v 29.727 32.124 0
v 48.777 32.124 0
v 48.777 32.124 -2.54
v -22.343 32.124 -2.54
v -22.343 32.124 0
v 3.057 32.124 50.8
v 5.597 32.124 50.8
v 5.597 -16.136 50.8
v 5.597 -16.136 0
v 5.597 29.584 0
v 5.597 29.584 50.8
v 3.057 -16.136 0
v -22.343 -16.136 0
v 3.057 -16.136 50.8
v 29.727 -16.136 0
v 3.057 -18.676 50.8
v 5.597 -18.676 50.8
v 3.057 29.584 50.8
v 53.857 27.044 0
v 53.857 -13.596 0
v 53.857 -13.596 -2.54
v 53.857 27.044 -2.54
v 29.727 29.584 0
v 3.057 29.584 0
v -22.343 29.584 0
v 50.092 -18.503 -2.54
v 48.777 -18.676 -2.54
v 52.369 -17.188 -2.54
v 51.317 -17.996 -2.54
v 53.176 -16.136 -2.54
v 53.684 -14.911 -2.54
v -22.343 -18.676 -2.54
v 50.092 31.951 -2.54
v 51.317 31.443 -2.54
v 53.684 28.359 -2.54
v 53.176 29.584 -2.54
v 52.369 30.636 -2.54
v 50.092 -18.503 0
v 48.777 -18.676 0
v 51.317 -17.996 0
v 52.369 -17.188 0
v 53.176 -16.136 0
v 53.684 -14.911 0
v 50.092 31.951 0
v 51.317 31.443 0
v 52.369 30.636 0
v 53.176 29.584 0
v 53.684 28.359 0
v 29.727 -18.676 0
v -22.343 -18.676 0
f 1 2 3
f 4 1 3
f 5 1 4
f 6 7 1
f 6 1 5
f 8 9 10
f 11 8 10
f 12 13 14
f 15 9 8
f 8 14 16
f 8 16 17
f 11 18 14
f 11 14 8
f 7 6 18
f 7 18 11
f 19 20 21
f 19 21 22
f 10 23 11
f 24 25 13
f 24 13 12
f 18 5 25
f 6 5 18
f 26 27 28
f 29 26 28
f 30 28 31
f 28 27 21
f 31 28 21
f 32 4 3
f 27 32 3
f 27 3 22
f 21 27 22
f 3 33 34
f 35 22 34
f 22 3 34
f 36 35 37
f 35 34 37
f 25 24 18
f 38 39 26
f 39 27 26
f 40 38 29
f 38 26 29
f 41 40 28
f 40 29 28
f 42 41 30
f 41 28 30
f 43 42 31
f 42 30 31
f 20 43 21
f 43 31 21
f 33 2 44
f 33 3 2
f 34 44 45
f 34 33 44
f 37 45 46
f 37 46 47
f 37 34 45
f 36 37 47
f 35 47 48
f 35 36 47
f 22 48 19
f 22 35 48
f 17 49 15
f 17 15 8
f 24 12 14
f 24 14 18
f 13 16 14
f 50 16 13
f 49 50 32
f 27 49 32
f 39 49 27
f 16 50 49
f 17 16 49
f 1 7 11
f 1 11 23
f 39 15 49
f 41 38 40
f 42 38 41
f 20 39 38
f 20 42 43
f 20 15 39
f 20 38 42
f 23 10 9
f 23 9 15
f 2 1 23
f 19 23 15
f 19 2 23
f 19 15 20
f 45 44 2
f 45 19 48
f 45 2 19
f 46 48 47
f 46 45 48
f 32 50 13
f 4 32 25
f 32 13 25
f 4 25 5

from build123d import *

# Parameters (mm, degrees)
F0_W     = 48.26
F0_H     = 50.8
F0_W_2   = 25.4
F0_W_3   = 2.54
F1_DEPTH = 2.54
F2_DEPTH = 50.8
F4_DEPTH = 2.54
F6_DEPTH = 2.54
F7_R     = 5.08


with BuildPart() as f1:
    # F0 (on Top) → F1 (new body)
    with BuildSketch(Plane.XY):
        with Locations((29.726995, 6.723735)):
            Rectangle(F0_W, F0_H)
        with Locations((-9.643005, 6.723735)):
            Rectangle(F0_W_2, F0_H)
        with Locations((4.326995, 6.723735)):
            Rectangle(F0_W_3, F0_H)
    extrude(amount=-F1_DEPTH)

    # F0 (on Top) → F2 (join)
    with BuildSketch(Plane.XY):
        with Locations((4.326995, 6.723735)):
            Rectangle(F0_W_3, F0_H)
    extrude(amount=F2_DEPTH)

    # F3 (on face) → F4 (join)
    with BuildSketch(Plane.XZ.offset(18.676265)):
        Polygon((3.056995, 50.8), (-22.343005, 0), (3.056995, 0), align=None)
        Polygon((29.726995, 0), (5.596995, 50.8), (5.596995, 0), align=None)
    extrude(amount=-F4_DEPTH)

    # F5 (on face) → F6 (join)
    with BuildSketch(Plane(origin=(0, 32.123735, 0), x_dir=(-1, 0, 0), z_dir=(0, 1, 0))):
        Polygon((22.343005, 0), (-3.056995, 50.8), (-3.056995, 0), align=None)
        Polygon((-5.596995, 0), (-5.596995, 50.8), (-29.726995, 0), align=None)
    extrude(amount=-F6_DEPTH)

    # F7
    f7_edges = [f1.edges().sort_by_distance(p)[0] for p in [
        (53.856995, -18.676265, -1.27),
        (53.856995, 32.123735, -1.27),
    ]]
    fillet(f7_edges, radius=F7_R)


solid = f1.part
